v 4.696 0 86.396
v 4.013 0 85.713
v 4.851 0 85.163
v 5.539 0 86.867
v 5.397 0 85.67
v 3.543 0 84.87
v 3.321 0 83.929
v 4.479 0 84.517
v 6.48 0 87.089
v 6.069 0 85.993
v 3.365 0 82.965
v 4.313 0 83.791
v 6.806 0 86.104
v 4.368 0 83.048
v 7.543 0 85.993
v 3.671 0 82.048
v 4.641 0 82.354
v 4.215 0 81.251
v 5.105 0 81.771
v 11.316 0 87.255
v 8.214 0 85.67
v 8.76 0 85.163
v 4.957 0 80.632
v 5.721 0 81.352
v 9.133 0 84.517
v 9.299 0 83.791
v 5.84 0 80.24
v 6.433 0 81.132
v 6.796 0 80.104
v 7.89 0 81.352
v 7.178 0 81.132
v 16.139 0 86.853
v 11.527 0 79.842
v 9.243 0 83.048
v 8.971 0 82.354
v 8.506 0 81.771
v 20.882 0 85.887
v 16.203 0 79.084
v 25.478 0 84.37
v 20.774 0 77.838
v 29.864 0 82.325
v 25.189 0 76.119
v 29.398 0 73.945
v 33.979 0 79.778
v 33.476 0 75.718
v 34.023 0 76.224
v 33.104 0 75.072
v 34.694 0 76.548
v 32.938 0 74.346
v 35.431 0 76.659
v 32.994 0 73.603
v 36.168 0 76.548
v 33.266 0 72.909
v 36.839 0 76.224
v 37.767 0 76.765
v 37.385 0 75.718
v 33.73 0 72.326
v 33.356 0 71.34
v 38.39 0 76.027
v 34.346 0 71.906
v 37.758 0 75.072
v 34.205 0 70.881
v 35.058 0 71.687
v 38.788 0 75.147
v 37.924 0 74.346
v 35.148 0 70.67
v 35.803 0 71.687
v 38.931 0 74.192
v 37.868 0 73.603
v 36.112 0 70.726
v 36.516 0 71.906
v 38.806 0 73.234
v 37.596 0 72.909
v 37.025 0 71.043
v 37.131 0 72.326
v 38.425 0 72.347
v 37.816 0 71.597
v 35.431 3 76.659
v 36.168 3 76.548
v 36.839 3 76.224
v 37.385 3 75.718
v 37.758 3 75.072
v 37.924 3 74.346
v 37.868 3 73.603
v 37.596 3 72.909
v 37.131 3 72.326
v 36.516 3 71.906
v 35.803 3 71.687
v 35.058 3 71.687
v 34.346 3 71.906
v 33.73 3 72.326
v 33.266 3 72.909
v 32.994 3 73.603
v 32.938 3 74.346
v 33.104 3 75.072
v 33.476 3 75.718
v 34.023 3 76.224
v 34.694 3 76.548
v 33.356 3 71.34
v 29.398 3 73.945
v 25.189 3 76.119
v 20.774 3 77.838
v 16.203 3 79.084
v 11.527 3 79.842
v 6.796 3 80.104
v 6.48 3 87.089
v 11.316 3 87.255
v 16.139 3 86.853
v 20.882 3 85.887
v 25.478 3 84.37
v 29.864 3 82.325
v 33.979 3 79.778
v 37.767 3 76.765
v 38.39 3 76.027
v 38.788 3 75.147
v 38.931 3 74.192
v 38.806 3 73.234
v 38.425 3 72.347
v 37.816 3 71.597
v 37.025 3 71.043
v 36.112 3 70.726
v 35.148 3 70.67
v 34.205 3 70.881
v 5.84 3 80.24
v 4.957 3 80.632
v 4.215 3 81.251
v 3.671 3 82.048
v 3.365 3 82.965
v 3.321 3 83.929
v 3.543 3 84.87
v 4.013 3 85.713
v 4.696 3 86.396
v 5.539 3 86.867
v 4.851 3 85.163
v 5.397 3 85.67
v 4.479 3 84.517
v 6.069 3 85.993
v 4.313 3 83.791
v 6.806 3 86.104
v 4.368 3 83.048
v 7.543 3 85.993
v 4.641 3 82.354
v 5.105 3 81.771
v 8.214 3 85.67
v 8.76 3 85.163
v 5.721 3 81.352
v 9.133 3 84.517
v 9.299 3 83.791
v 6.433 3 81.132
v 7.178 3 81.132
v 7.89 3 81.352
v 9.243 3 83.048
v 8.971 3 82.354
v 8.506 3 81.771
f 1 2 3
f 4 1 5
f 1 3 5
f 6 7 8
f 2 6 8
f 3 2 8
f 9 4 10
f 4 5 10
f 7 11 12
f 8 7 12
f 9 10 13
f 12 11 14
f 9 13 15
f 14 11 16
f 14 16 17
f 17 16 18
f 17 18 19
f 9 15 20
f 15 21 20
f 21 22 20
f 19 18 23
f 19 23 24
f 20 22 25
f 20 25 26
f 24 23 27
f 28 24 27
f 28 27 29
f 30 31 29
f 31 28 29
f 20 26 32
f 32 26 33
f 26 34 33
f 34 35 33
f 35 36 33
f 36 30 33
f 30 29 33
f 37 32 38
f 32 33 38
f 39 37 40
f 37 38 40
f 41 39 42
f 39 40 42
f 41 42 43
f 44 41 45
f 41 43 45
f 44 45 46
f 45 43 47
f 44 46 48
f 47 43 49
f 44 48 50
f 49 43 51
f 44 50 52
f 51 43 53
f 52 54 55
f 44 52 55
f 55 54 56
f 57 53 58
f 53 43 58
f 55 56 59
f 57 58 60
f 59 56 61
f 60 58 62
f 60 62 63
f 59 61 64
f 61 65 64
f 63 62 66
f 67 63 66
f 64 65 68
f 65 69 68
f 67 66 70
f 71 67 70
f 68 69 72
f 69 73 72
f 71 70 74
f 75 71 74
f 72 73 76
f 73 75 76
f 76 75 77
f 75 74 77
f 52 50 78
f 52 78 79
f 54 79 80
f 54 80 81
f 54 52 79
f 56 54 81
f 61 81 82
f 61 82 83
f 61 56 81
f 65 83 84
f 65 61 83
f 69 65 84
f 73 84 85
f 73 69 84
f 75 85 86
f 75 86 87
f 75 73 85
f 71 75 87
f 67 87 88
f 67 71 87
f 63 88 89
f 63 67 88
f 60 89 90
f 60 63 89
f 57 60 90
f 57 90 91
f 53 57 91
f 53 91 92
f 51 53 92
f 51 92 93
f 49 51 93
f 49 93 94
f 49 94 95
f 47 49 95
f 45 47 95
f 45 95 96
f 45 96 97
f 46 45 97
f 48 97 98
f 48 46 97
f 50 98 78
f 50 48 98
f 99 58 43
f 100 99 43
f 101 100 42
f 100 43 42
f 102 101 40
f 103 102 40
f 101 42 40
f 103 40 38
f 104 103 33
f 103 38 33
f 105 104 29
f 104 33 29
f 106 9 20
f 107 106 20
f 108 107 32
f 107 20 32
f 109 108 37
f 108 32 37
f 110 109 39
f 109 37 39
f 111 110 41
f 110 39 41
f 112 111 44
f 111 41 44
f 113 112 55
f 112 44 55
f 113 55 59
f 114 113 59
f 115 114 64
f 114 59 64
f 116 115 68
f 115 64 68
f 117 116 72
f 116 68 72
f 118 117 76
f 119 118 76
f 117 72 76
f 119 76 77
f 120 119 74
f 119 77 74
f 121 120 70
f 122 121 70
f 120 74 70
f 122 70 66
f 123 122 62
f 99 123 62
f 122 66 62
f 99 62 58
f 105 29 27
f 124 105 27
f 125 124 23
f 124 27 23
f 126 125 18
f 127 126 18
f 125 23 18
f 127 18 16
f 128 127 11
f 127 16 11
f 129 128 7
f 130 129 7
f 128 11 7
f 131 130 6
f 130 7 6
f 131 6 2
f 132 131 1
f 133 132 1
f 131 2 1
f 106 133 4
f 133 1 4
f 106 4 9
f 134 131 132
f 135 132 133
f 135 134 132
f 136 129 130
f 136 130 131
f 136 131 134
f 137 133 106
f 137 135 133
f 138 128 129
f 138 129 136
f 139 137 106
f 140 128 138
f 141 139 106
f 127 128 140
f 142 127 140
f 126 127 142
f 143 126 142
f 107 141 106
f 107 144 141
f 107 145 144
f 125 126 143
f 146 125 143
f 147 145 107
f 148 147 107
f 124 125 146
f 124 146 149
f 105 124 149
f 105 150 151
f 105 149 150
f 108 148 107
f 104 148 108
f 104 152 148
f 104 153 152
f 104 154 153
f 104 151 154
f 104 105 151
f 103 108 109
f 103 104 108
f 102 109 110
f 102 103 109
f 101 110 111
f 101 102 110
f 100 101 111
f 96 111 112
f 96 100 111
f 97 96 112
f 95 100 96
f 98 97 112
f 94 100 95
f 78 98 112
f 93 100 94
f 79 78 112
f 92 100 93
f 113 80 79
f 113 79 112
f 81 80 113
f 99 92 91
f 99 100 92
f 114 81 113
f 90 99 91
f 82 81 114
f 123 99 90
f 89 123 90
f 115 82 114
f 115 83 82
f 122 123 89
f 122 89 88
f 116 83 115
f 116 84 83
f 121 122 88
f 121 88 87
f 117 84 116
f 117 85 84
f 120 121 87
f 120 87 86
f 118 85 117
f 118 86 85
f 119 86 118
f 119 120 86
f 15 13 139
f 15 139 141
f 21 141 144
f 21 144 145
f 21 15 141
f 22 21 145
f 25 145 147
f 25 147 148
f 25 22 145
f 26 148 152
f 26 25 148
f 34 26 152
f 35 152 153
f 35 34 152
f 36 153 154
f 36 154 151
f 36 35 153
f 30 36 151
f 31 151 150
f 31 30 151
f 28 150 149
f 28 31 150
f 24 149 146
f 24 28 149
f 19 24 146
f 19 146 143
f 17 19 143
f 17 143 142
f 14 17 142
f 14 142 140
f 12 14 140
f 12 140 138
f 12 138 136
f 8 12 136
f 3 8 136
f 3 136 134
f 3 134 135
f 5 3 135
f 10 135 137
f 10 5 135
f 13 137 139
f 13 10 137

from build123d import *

# Parameters (mm, degrees)
EXTRUDE_1_DEPTH     = 3
SKETCH_2_R          = 2.5
CUT_EXTRUDE_1_DEPTH = 3


with BuildPart() as part:
    # 草图1 → 凸台-拉伸1 (new body)
    with BuildSketch(Plane(origin=(0, 0, 0), x_dir=(1, 0, 0), z_dir=(0, 1, 0))):
        with BuildLine():
            ThreePointArc((6.796232726, -80.103971167), (3.309364716, -83.445468492), (6.479618851, -87.088728243))
            ThreePointArc((6.479618851, -87.088728243), (23.201931583, -85.196198653), (37.766812343, -76.765204654))
            ThreePointArc((37.766812343, -76.765204654), (38.146329718, -71.950662158), (33.355557274, -71.3404554))
            ThreePointArc((33.355557274, -71.3404554), (20.773998873, -77.837935766), (6.796232726, -80.103971167))
        make_face()
    extrude(amount=EXTRUDE_1_DEPTH)

    # 草图2 → 切除-拉伸1 (cut)
    with BuildSketch(Plane(origin=(0, 0, 0), x_dir=(1, 0, 0), z_dir=(0, 1, 0))):
        with Locations(Location((6.805774449, -83.603958161, 0), (0, 0, 270))):
            Circle(SKETCH_2_R)
        with Locations(Location((35.430824241, -74.158835612, 0), (0, 0, 270))):
            Circle(SKETCH_2_R)
    extrude(amount=CUT_EXTRUDE_1_DEPTH, mode=Mode.SUBTRACT)


solid = part.part
